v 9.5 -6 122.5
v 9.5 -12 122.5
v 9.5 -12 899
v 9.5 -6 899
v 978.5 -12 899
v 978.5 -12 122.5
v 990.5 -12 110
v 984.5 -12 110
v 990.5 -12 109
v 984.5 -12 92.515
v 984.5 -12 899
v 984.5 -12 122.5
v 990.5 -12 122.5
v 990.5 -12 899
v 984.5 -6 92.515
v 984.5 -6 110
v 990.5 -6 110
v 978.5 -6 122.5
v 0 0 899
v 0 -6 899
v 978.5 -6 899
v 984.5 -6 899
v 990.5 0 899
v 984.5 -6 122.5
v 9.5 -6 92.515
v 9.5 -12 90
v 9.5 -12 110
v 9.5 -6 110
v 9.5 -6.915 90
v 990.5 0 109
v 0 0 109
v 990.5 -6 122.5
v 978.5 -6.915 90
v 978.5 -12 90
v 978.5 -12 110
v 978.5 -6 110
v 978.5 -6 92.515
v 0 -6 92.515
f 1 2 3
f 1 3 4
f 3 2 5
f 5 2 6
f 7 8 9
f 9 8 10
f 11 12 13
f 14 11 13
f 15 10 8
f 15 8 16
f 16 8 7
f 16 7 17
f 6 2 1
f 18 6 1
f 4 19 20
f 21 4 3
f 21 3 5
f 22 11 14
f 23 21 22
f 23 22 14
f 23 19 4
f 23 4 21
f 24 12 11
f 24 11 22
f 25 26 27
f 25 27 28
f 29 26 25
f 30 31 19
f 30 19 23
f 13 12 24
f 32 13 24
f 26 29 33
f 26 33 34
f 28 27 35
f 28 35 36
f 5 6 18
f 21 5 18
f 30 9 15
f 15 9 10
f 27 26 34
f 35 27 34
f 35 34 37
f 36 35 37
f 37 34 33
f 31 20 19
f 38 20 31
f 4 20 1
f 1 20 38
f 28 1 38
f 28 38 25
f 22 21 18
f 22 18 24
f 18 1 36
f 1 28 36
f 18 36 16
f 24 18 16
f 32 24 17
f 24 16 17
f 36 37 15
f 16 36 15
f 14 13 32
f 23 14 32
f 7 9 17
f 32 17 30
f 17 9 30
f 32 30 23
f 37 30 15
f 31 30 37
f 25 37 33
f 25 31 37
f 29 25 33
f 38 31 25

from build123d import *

# Parameters (mm, degrees)
F0_W      = 990.5
F0_H      = 12
F1_DEPTH  = 899
F2_W      = 9.5
F2_H      = 6
F3_DEPTH  = 899.001
F4_W      = 6
F4_H      = 6
F5_DEPTH  = 899.001
F6_W      = 6
F6_H      = 12.5
F7_DEPTH  = 990.501
F9_DEPTH  = 990.501
F11_DEPTH = 12.001


with BuildPart() as f1:
    # F0 (on Top) → F1 (new body)
    with BuildSketch(Plane.XY):
        with Locations((495.25, -6)):
            Rectangle(F0_W, F0_H)
    extrude(amount=F1_DEPTH)

    # F2 (on Top) → F3 (cut, through all)
    with BuildSketch(Plane.XY):
        with Locations((4.75, -9)):
            Rectangle(F2_W, F2_H)
    extrude(amount=F3_DEPTH, mode=Mode.SUBTRACT)

    # F4 (on Top) → F5 (cut, through all)
    with BuildSketch(Plane.XY):
        with Locations((981.5, -9)):
            Rectangle(F4_W, F4_H)
    extrude(amount=F5_DEPTH, mode=Mode.SUBTRACT)

    # F6 (on Right) → F7 (cut, through all)
    with BuildSketch(Plane.YZ):
        with Locations((-9, 116.25)):
            Rectangle(F6_W, F6_H)
    extrude(amount=F7_DEPTH, mode=Mode.SUBTRACT)

    # F8 (on Right) → F9 (cut, through all)
    with BuildSketch(Plane.YZ):
        Polygon((-25, 0), (0, 0), (0, 109), (-6.915434, 90), (-25, 90), align=None)
    extrude(amount=F9_DEPTH, mode=Mode.SUBTRACT)

    # F10 (on face) → F11 (cut, through all)
    with BuildSketch(Plane.XZ.offset(12)):
        Polygon((983.584566, 90), (990.5, 90), (990.5, 109), align=None)
    extrude(amount=-F11_DEPTH, mode=Mode.SUBTRACT)


solid = f1.part
